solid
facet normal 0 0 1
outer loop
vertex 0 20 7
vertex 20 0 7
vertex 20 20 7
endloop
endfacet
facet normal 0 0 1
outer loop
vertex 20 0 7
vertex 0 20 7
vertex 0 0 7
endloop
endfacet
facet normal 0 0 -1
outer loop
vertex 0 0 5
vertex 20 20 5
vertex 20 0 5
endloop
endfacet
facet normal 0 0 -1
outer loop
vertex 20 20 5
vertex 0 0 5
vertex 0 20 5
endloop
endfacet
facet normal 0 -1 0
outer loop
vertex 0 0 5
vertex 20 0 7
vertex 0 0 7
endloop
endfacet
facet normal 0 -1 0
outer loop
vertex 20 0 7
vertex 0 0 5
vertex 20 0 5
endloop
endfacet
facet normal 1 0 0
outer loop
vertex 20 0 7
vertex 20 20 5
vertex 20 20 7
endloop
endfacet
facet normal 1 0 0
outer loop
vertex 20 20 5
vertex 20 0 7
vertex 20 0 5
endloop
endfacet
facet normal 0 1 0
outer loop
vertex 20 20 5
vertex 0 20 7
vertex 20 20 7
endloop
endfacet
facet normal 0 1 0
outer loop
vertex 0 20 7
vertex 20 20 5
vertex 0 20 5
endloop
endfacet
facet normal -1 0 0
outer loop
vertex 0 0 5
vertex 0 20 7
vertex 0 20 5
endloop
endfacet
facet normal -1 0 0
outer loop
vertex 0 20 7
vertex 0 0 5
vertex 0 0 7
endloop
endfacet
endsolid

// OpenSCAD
// Generated by scadwright. Do not hand-edit —
// edit the Python source and regenerate.

color("red") {
    translate([0, 0, 5]) {
        // _Plate
        cube([20, 20, 2], center=false);
    }
}
